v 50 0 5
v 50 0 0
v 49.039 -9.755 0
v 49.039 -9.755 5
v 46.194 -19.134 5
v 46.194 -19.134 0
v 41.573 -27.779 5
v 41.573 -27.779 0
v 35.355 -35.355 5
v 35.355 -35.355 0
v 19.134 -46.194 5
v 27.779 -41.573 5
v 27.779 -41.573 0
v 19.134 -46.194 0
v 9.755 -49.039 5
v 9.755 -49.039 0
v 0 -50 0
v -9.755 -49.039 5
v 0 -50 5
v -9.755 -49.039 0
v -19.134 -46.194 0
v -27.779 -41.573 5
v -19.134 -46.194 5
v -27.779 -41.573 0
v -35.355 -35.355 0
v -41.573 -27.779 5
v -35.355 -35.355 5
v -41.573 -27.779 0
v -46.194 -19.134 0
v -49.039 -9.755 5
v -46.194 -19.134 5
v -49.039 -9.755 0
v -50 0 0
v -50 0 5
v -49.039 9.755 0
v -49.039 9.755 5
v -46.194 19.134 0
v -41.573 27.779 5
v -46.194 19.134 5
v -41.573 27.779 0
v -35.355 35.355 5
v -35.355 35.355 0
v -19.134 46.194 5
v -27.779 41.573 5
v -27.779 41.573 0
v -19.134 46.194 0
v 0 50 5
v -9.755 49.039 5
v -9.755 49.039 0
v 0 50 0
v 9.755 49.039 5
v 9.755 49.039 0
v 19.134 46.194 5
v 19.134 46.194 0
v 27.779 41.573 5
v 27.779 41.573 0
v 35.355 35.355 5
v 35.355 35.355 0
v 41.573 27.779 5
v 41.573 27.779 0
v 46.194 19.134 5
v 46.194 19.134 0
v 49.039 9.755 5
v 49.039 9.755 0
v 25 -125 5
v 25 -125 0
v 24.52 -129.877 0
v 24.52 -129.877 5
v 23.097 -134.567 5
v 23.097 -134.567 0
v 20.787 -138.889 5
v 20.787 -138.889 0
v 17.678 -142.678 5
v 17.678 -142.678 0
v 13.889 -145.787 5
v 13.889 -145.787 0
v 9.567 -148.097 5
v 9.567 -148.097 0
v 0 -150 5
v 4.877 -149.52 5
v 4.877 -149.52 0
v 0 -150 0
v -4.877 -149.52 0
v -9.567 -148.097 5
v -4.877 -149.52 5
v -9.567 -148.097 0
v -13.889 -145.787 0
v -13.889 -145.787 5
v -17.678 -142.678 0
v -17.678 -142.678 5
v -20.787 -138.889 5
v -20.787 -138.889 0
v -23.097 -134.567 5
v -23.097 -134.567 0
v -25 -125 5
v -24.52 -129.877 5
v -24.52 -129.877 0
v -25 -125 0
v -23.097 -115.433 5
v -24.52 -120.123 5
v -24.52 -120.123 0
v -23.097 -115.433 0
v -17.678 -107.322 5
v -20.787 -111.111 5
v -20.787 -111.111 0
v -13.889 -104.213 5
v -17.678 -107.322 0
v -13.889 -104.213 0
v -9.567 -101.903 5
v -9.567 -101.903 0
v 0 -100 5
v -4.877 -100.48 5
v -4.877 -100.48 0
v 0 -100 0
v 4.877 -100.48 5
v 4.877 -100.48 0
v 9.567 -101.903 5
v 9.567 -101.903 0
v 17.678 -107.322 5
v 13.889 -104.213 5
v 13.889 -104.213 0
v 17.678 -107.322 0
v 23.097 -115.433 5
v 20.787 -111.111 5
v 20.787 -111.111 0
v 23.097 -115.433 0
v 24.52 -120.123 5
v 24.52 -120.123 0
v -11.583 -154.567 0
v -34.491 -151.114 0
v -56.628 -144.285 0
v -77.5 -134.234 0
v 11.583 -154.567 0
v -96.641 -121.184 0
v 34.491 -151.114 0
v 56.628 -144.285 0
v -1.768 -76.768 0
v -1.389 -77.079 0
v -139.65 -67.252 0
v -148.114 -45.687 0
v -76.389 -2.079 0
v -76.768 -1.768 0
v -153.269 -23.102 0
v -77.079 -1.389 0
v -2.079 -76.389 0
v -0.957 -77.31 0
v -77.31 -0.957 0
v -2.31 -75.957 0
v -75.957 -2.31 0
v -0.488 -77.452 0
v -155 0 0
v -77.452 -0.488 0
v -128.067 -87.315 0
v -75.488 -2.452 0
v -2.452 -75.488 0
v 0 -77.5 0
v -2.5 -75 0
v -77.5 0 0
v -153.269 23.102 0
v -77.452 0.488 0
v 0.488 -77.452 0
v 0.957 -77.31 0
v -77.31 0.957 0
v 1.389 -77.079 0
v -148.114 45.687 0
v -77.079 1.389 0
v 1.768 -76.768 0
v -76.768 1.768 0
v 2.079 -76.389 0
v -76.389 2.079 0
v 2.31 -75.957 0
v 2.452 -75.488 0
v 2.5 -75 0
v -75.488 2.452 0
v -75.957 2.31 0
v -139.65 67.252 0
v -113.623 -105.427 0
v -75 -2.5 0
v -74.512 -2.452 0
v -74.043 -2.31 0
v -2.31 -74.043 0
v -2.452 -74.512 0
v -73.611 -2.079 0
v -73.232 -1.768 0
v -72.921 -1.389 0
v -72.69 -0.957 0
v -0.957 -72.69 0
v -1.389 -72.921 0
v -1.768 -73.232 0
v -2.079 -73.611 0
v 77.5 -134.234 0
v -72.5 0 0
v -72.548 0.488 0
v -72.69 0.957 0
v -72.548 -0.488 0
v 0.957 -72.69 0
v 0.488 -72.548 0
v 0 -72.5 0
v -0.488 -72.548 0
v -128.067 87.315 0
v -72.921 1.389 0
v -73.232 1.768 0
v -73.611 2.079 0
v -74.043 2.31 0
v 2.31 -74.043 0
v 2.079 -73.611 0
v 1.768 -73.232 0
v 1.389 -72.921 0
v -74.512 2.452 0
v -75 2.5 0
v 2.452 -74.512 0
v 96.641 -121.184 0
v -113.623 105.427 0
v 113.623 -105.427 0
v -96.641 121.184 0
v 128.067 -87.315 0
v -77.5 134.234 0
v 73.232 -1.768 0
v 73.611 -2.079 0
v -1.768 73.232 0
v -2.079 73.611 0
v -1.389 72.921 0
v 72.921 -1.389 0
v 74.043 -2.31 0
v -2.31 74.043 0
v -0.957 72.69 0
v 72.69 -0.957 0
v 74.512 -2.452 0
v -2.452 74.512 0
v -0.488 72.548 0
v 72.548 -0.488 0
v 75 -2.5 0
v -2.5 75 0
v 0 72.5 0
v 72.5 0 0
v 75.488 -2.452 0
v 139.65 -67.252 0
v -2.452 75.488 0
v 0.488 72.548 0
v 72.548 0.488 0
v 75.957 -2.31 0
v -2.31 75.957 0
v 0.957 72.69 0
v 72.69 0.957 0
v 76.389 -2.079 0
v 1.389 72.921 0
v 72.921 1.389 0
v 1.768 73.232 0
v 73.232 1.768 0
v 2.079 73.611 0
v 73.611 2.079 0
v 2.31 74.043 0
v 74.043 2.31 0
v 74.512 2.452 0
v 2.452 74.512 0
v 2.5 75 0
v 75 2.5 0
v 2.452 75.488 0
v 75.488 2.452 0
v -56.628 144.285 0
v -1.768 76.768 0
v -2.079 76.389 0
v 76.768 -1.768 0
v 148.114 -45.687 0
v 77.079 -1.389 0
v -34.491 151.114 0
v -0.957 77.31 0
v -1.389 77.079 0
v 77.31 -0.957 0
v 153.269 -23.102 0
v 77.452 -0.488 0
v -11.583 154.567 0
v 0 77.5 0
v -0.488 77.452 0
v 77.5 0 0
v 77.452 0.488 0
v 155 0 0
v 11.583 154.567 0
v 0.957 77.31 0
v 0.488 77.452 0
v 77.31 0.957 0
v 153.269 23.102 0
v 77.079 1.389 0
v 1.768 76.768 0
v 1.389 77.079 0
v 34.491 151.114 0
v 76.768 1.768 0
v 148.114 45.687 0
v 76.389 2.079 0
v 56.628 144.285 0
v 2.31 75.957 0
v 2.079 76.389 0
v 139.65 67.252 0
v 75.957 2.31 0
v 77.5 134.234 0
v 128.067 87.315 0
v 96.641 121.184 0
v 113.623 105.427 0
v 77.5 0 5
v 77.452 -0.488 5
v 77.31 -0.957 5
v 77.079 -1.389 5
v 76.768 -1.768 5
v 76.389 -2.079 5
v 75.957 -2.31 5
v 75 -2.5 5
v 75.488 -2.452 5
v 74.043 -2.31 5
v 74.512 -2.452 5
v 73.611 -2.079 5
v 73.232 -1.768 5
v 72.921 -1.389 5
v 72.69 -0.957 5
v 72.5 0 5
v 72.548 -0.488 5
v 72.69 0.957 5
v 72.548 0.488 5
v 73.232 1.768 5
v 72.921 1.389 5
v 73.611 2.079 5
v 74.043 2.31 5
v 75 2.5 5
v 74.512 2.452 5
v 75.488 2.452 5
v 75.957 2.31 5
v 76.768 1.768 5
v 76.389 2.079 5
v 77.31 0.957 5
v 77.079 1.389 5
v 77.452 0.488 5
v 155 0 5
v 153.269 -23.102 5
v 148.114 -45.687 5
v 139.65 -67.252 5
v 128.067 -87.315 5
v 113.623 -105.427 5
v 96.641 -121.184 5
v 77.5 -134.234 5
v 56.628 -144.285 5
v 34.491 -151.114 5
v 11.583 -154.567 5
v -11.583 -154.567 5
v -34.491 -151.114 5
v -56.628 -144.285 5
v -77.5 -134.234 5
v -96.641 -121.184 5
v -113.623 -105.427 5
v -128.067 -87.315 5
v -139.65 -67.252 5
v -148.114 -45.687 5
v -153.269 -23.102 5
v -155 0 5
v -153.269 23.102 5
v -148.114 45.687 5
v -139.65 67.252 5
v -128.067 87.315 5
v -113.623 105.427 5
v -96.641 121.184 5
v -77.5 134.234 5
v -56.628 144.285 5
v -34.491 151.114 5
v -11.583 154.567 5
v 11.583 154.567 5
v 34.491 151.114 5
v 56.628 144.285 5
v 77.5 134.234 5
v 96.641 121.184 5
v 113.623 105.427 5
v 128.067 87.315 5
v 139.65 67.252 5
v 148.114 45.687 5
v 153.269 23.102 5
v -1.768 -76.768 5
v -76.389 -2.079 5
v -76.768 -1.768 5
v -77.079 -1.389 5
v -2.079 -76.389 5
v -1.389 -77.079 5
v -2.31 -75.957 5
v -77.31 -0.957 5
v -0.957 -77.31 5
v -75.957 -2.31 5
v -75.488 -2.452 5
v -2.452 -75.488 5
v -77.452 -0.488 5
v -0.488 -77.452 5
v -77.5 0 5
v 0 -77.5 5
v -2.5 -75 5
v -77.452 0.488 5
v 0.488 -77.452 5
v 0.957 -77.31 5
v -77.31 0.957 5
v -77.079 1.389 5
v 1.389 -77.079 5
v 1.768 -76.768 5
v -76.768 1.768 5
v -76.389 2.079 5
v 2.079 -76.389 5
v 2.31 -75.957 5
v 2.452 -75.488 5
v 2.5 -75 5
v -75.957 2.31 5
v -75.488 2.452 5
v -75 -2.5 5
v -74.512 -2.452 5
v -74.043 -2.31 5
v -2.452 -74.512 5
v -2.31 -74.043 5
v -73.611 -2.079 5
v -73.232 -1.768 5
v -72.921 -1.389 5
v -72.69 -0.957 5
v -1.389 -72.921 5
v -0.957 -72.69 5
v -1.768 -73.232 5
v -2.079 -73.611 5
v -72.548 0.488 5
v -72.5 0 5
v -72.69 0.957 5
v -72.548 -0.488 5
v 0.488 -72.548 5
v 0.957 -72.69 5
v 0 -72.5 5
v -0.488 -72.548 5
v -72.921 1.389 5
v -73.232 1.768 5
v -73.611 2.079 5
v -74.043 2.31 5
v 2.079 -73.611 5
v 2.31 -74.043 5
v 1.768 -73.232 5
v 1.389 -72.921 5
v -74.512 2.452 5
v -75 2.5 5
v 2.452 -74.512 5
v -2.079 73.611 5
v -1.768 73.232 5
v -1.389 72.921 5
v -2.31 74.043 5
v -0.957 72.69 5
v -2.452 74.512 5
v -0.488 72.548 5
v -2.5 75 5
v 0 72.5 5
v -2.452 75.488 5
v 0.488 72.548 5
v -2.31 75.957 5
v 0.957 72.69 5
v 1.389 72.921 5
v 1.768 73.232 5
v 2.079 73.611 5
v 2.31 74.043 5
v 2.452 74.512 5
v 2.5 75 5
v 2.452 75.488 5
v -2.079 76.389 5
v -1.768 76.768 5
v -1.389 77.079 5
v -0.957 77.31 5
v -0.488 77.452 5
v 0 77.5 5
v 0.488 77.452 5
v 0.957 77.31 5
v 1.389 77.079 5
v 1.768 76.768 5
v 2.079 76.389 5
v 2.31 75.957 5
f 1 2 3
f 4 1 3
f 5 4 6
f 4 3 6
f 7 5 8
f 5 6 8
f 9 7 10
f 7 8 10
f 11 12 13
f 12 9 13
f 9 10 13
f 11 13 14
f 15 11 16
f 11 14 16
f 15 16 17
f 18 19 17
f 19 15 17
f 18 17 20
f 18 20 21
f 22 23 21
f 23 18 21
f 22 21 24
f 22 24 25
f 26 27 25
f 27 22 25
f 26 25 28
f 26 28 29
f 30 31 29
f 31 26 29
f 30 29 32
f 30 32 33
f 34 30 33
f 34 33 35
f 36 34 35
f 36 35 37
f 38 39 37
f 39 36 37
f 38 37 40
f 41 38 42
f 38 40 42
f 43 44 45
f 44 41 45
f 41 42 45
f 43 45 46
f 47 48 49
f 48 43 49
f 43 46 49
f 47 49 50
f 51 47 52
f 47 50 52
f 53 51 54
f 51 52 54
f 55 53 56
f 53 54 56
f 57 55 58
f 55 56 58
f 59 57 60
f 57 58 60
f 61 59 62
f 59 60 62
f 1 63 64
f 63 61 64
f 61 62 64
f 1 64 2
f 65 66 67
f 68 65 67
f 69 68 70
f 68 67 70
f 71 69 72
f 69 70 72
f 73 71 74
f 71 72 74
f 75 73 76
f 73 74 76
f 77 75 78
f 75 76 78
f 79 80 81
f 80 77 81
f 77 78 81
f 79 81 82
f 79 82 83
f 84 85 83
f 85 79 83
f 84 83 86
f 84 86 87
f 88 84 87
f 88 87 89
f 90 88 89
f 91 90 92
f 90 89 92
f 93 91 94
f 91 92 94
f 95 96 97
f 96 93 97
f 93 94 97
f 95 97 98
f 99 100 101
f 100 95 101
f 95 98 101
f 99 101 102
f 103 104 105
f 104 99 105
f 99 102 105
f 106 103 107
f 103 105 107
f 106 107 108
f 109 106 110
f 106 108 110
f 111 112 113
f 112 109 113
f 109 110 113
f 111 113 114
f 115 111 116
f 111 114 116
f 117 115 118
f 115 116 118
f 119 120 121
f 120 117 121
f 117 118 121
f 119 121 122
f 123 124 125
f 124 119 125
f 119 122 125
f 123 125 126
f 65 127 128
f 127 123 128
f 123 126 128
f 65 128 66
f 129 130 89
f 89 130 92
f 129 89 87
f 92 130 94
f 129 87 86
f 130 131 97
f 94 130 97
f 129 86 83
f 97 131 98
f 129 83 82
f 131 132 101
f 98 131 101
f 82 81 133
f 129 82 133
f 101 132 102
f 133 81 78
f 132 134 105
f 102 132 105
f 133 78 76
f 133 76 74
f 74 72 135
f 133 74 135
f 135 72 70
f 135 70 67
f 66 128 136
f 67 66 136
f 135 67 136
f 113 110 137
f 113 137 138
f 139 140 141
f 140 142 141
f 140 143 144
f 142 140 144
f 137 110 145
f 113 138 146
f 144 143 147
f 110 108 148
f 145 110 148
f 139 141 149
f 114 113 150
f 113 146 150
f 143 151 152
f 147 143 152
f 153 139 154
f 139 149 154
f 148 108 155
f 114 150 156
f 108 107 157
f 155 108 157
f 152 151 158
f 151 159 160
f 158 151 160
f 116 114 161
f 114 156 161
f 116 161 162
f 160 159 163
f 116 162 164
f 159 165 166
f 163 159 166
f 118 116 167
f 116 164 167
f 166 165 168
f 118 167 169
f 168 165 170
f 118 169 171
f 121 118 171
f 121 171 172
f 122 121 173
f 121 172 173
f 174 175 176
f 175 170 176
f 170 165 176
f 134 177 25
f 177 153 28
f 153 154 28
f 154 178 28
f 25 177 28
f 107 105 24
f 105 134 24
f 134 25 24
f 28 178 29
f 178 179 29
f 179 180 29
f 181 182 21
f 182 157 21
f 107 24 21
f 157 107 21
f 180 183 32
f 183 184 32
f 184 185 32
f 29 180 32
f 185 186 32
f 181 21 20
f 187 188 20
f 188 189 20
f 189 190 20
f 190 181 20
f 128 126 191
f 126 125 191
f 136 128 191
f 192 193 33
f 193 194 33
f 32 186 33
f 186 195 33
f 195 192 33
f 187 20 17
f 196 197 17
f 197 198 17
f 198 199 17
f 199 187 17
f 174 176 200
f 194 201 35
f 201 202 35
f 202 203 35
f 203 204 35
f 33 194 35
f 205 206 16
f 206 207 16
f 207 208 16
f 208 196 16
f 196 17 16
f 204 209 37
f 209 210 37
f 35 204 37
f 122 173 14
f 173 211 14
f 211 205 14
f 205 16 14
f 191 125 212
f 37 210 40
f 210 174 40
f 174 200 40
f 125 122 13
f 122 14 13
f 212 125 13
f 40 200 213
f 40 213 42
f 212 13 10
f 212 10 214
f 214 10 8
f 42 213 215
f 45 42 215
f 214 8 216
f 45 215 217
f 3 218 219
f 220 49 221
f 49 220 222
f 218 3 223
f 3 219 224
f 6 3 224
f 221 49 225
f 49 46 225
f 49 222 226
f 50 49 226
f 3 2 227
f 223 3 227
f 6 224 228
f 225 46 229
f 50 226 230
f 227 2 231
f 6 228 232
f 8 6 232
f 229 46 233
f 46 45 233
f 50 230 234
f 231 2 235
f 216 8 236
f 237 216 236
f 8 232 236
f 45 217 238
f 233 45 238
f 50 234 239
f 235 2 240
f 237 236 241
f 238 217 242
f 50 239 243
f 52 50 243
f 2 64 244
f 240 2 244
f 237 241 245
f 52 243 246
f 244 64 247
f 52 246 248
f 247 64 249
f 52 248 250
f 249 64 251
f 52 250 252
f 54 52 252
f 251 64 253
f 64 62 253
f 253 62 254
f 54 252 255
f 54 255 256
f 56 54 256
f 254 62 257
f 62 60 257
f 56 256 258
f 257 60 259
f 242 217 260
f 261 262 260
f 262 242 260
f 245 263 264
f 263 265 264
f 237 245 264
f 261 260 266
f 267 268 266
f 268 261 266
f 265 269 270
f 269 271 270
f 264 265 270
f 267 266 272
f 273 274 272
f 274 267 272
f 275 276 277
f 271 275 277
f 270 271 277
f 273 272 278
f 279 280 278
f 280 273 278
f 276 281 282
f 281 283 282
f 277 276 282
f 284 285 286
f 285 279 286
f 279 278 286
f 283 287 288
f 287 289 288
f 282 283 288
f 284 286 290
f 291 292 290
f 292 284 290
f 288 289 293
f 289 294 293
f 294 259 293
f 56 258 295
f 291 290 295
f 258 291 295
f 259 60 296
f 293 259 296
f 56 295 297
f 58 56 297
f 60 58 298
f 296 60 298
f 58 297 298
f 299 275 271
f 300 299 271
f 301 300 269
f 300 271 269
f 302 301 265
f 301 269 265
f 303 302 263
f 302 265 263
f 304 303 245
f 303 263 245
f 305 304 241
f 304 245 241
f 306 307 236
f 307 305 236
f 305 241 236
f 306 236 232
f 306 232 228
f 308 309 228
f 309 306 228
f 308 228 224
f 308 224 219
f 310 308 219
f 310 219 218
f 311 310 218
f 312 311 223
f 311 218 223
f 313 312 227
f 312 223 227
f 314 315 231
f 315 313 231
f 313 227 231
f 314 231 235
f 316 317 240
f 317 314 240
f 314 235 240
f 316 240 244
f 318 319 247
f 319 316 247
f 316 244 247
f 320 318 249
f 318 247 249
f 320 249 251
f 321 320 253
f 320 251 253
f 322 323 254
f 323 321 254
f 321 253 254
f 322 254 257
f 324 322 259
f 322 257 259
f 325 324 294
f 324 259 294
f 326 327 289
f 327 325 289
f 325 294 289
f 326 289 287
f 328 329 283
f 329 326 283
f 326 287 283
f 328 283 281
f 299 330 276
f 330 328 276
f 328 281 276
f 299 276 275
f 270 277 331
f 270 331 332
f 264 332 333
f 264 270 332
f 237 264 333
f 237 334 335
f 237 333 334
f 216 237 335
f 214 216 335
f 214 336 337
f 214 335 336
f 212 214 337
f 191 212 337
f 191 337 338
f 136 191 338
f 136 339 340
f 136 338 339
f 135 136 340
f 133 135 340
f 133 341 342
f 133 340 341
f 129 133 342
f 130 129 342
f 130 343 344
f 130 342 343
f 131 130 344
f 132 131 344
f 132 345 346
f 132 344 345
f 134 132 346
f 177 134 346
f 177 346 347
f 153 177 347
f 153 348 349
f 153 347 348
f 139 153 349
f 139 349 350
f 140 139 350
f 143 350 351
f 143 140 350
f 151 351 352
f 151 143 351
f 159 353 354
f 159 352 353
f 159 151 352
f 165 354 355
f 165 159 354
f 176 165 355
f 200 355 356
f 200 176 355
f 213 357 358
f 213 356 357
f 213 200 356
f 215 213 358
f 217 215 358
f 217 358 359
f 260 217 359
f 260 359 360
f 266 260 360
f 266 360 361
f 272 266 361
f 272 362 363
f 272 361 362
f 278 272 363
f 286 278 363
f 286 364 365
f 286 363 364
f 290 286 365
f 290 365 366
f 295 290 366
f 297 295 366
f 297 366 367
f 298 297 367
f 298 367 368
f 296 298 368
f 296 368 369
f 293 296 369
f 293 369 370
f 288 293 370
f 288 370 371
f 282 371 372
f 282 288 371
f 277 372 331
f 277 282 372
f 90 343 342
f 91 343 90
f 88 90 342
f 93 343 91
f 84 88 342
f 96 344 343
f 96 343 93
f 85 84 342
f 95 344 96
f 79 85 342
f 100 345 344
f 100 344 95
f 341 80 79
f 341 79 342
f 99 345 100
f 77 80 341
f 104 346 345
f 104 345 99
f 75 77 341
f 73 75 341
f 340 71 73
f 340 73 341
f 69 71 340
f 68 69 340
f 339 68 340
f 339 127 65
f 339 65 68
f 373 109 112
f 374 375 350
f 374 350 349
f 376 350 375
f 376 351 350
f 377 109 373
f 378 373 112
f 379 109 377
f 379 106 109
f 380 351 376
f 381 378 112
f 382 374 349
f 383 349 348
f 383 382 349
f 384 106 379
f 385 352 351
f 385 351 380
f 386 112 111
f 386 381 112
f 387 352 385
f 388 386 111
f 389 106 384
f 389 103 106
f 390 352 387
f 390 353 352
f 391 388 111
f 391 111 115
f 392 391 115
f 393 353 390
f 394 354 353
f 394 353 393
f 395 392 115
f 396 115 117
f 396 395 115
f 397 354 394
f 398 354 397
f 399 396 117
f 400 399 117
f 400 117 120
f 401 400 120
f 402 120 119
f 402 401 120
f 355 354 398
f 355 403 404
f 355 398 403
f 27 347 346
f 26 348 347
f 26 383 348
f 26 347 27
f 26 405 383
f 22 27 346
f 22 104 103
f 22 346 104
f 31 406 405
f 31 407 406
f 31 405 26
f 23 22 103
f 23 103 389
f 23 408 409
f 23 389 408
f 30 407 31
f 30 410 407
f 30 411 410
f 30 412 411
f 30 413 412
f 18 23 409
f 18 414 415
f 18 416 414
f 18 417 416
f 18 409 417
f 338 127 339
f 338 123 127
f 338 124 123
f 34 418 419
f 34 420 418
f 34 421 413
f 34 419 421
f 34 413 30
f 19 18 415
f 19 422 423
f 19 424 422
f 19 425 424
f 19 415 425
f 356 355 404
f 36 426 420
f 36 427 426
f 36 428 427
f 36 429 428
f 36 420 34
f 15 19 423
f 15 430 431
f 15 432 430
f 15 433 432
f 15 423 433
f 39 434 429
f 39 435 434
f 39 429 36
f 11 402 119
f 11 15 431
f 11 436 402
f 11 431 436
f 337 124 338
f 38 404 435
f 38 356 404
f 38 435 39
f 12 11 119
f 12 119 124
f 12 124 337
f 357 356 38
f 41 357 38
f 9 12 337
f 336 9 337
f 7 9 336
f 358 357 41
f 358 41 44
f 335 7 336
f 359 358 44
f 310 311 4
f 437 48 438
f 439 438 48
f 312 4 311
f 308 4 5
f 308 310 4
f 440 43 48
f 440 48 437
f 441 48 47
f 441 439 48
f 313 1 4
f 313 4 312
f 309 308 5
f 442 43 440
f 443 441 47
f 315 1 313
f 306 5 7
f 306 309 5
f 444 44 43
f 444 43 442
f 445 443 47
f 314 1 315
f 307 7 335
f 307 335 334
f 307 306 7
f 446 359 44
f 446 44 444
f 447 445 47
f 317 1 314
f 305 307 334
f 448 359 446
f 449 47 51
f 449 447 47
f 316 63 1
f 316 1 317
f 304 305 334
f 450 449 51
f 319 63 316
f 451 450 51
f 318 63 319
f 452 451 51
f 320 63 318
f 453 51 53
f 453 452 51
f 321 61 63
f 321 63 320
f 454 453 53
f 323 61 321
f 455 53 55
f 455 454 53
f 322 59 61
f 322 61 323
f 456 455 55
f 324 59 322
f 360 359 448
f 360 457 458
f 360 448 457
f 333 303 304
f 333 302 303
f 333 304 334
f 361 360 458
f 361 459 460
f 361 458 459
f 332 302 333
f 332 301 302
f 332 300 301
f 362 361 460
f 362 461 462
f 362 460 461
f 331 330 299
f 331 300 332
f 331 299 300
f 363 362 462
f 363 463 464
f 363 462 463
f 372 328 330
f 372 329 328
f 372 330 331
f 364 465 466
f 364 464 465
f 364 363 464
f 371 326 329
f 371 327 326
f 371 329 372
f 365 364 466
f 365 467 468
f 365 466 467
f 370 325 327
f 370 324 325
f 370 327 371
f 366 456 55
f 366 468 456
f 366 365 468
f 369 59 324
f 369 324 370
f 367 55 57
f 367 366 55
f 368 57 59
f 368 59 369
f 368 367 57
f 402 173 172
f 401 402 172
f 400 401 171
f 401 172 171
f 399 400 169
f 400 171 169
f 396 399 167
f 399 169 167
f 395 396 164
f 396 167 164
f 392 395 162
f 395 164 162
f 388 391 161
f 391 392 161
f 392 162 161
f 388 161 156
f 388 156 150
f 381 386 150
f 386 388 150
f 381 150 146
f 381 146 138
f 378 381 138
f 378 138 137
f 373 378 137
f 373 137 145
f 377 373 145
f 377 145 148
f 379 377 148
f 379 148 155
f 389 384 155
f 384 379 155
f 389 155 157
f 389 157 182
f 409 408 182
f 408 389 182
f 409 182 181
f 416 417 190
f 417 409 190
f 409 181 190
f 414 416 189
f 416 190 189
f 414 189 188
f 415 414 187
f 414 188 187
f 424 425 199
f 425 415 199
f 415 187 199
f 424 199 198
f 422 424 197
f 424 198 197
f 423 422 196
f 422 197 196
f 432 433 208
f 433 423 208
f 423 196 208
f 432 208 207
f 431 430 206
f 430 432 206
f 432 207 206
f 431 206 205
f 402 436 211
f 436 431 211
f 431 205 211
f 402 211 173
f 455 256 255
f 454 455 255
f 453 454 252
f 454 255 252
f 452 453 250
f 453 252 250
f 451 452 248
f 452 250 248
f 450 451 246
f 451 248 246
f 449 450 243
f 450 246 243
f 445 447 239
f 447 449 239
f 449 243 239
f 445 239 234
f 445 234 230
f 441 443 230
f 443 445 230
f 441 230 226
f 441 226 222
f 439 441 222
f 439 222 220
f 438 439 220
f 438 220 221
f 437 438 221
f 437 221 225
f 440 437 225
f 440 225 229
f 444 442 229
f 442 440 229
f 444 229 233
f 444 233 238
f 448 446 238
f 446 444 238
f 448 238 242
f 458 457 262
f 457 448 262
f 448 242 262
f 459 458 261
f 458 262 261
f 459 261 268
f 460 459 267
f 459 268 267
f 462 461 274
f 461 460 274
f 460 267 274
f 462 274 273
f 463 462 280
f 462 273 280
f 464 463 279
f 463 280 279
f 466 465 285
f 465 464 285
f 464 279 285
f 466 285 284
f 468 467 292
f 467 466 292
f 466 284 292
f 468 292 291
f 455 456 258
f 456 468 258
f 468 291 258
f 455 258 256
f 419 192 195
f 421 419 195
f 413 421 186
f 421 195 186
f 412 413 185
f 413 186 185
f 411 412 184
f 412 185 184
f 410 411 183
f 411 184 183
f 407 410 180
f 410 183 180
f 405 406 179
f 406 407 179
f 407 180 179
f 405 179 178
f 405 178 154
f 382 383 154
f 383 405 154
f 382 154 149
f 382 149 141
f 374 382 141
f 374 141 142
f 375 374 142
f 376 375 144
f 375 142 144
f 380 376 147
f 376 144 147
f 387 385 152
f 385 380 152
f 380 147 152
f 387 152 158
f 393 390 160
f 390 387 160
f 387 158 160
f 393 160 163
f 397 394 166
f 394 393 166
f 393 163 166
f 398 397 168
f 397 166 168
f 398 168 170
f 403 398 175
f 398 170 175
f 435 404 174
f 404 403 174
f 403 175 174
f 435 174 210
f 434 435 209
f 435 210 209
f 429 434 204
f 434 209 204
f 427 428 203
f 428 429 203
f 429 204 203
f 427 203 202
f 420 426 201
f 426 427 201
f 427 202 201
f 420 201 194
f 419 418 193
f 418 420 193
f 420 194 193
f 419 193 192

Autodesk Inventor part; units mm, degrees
ref_plane "YZ Plane" through (0, 0, 0) normal (1, 0, 0) x (0, 1, 0)
ref_plane "XZ Plane" through (0, 0, 0) normal (0, 1, 0) x (-1, 0, 0)
ref_plane "XY Plane" through (0, 0, 0) normal (0, 0, 1) x (1, 0, 0)
sketch "Sketch1" plane through (0, 0, 0) normal (0, 0, 1) x (1, 0, 0)
  circle A0 centre (0, 0) radius 150
  circle A1 centre (0, 0) radius 100
  circle A2 centre (0, 0) radius 155
  circle A3 centre (0, -125) radius 25
  circle A4 centre (0, 0) radius 87.5
  circle A5 centre (0, 0) radius 75
  circle A6 centre (0, 0) radius 50
  circle A7 centre (75, 0) radius 2.5
  circle A8 centre (0, -75) radius 2.5
  circle A9 centre (0, 75) radius 2.5
  circle A10 centre (-75, 0) radius 2.5
  point P0 (0, -150)
  point P1 (0, -100)
  dimension "d0" = 300
  dimension "d1" = 200
  dimension "d2" = 310
  dimension "d3" = 50
  dimension "d8" = 175
  dimension "d9" = 150
  dimension "d10" = 100
  dimension "d11" = 5
  dimension "d12" = 5
  dimension "d13" = 5
  dimension "d14" = 5
extrude "Extrusion1" add sketch "Sketch1" along normal blind 5 contours A1 | A0 | A2 | A4 | A7 A5 A8 A10 A9
equation "\"d0\" = 6 * Product_dia"
equation "\"d1\" = 4 * Product_dia"
equation "\"d3\" = Product_dia"
equation "\"d8\" = 3.5 * Product_dia"
equation "\"d12\" = d11"
equation "\"d13\" = d11"
equation "\"d14\" = d11"
equation "\"Product_dia\" = 50"
equation "\"GridTotalSize\" = 63"
equation "\"GridBorderThickness\" = 5"
equation "\"GridBorderFillets\" = 7"
equation "\"BaseTotalWidth\" = 352"
equation "\"GridProcutClearance\" = 3"
equation "\"ProductBaseHeight\" = 35"
properties material "Steel, Paint Finish, Blue"
